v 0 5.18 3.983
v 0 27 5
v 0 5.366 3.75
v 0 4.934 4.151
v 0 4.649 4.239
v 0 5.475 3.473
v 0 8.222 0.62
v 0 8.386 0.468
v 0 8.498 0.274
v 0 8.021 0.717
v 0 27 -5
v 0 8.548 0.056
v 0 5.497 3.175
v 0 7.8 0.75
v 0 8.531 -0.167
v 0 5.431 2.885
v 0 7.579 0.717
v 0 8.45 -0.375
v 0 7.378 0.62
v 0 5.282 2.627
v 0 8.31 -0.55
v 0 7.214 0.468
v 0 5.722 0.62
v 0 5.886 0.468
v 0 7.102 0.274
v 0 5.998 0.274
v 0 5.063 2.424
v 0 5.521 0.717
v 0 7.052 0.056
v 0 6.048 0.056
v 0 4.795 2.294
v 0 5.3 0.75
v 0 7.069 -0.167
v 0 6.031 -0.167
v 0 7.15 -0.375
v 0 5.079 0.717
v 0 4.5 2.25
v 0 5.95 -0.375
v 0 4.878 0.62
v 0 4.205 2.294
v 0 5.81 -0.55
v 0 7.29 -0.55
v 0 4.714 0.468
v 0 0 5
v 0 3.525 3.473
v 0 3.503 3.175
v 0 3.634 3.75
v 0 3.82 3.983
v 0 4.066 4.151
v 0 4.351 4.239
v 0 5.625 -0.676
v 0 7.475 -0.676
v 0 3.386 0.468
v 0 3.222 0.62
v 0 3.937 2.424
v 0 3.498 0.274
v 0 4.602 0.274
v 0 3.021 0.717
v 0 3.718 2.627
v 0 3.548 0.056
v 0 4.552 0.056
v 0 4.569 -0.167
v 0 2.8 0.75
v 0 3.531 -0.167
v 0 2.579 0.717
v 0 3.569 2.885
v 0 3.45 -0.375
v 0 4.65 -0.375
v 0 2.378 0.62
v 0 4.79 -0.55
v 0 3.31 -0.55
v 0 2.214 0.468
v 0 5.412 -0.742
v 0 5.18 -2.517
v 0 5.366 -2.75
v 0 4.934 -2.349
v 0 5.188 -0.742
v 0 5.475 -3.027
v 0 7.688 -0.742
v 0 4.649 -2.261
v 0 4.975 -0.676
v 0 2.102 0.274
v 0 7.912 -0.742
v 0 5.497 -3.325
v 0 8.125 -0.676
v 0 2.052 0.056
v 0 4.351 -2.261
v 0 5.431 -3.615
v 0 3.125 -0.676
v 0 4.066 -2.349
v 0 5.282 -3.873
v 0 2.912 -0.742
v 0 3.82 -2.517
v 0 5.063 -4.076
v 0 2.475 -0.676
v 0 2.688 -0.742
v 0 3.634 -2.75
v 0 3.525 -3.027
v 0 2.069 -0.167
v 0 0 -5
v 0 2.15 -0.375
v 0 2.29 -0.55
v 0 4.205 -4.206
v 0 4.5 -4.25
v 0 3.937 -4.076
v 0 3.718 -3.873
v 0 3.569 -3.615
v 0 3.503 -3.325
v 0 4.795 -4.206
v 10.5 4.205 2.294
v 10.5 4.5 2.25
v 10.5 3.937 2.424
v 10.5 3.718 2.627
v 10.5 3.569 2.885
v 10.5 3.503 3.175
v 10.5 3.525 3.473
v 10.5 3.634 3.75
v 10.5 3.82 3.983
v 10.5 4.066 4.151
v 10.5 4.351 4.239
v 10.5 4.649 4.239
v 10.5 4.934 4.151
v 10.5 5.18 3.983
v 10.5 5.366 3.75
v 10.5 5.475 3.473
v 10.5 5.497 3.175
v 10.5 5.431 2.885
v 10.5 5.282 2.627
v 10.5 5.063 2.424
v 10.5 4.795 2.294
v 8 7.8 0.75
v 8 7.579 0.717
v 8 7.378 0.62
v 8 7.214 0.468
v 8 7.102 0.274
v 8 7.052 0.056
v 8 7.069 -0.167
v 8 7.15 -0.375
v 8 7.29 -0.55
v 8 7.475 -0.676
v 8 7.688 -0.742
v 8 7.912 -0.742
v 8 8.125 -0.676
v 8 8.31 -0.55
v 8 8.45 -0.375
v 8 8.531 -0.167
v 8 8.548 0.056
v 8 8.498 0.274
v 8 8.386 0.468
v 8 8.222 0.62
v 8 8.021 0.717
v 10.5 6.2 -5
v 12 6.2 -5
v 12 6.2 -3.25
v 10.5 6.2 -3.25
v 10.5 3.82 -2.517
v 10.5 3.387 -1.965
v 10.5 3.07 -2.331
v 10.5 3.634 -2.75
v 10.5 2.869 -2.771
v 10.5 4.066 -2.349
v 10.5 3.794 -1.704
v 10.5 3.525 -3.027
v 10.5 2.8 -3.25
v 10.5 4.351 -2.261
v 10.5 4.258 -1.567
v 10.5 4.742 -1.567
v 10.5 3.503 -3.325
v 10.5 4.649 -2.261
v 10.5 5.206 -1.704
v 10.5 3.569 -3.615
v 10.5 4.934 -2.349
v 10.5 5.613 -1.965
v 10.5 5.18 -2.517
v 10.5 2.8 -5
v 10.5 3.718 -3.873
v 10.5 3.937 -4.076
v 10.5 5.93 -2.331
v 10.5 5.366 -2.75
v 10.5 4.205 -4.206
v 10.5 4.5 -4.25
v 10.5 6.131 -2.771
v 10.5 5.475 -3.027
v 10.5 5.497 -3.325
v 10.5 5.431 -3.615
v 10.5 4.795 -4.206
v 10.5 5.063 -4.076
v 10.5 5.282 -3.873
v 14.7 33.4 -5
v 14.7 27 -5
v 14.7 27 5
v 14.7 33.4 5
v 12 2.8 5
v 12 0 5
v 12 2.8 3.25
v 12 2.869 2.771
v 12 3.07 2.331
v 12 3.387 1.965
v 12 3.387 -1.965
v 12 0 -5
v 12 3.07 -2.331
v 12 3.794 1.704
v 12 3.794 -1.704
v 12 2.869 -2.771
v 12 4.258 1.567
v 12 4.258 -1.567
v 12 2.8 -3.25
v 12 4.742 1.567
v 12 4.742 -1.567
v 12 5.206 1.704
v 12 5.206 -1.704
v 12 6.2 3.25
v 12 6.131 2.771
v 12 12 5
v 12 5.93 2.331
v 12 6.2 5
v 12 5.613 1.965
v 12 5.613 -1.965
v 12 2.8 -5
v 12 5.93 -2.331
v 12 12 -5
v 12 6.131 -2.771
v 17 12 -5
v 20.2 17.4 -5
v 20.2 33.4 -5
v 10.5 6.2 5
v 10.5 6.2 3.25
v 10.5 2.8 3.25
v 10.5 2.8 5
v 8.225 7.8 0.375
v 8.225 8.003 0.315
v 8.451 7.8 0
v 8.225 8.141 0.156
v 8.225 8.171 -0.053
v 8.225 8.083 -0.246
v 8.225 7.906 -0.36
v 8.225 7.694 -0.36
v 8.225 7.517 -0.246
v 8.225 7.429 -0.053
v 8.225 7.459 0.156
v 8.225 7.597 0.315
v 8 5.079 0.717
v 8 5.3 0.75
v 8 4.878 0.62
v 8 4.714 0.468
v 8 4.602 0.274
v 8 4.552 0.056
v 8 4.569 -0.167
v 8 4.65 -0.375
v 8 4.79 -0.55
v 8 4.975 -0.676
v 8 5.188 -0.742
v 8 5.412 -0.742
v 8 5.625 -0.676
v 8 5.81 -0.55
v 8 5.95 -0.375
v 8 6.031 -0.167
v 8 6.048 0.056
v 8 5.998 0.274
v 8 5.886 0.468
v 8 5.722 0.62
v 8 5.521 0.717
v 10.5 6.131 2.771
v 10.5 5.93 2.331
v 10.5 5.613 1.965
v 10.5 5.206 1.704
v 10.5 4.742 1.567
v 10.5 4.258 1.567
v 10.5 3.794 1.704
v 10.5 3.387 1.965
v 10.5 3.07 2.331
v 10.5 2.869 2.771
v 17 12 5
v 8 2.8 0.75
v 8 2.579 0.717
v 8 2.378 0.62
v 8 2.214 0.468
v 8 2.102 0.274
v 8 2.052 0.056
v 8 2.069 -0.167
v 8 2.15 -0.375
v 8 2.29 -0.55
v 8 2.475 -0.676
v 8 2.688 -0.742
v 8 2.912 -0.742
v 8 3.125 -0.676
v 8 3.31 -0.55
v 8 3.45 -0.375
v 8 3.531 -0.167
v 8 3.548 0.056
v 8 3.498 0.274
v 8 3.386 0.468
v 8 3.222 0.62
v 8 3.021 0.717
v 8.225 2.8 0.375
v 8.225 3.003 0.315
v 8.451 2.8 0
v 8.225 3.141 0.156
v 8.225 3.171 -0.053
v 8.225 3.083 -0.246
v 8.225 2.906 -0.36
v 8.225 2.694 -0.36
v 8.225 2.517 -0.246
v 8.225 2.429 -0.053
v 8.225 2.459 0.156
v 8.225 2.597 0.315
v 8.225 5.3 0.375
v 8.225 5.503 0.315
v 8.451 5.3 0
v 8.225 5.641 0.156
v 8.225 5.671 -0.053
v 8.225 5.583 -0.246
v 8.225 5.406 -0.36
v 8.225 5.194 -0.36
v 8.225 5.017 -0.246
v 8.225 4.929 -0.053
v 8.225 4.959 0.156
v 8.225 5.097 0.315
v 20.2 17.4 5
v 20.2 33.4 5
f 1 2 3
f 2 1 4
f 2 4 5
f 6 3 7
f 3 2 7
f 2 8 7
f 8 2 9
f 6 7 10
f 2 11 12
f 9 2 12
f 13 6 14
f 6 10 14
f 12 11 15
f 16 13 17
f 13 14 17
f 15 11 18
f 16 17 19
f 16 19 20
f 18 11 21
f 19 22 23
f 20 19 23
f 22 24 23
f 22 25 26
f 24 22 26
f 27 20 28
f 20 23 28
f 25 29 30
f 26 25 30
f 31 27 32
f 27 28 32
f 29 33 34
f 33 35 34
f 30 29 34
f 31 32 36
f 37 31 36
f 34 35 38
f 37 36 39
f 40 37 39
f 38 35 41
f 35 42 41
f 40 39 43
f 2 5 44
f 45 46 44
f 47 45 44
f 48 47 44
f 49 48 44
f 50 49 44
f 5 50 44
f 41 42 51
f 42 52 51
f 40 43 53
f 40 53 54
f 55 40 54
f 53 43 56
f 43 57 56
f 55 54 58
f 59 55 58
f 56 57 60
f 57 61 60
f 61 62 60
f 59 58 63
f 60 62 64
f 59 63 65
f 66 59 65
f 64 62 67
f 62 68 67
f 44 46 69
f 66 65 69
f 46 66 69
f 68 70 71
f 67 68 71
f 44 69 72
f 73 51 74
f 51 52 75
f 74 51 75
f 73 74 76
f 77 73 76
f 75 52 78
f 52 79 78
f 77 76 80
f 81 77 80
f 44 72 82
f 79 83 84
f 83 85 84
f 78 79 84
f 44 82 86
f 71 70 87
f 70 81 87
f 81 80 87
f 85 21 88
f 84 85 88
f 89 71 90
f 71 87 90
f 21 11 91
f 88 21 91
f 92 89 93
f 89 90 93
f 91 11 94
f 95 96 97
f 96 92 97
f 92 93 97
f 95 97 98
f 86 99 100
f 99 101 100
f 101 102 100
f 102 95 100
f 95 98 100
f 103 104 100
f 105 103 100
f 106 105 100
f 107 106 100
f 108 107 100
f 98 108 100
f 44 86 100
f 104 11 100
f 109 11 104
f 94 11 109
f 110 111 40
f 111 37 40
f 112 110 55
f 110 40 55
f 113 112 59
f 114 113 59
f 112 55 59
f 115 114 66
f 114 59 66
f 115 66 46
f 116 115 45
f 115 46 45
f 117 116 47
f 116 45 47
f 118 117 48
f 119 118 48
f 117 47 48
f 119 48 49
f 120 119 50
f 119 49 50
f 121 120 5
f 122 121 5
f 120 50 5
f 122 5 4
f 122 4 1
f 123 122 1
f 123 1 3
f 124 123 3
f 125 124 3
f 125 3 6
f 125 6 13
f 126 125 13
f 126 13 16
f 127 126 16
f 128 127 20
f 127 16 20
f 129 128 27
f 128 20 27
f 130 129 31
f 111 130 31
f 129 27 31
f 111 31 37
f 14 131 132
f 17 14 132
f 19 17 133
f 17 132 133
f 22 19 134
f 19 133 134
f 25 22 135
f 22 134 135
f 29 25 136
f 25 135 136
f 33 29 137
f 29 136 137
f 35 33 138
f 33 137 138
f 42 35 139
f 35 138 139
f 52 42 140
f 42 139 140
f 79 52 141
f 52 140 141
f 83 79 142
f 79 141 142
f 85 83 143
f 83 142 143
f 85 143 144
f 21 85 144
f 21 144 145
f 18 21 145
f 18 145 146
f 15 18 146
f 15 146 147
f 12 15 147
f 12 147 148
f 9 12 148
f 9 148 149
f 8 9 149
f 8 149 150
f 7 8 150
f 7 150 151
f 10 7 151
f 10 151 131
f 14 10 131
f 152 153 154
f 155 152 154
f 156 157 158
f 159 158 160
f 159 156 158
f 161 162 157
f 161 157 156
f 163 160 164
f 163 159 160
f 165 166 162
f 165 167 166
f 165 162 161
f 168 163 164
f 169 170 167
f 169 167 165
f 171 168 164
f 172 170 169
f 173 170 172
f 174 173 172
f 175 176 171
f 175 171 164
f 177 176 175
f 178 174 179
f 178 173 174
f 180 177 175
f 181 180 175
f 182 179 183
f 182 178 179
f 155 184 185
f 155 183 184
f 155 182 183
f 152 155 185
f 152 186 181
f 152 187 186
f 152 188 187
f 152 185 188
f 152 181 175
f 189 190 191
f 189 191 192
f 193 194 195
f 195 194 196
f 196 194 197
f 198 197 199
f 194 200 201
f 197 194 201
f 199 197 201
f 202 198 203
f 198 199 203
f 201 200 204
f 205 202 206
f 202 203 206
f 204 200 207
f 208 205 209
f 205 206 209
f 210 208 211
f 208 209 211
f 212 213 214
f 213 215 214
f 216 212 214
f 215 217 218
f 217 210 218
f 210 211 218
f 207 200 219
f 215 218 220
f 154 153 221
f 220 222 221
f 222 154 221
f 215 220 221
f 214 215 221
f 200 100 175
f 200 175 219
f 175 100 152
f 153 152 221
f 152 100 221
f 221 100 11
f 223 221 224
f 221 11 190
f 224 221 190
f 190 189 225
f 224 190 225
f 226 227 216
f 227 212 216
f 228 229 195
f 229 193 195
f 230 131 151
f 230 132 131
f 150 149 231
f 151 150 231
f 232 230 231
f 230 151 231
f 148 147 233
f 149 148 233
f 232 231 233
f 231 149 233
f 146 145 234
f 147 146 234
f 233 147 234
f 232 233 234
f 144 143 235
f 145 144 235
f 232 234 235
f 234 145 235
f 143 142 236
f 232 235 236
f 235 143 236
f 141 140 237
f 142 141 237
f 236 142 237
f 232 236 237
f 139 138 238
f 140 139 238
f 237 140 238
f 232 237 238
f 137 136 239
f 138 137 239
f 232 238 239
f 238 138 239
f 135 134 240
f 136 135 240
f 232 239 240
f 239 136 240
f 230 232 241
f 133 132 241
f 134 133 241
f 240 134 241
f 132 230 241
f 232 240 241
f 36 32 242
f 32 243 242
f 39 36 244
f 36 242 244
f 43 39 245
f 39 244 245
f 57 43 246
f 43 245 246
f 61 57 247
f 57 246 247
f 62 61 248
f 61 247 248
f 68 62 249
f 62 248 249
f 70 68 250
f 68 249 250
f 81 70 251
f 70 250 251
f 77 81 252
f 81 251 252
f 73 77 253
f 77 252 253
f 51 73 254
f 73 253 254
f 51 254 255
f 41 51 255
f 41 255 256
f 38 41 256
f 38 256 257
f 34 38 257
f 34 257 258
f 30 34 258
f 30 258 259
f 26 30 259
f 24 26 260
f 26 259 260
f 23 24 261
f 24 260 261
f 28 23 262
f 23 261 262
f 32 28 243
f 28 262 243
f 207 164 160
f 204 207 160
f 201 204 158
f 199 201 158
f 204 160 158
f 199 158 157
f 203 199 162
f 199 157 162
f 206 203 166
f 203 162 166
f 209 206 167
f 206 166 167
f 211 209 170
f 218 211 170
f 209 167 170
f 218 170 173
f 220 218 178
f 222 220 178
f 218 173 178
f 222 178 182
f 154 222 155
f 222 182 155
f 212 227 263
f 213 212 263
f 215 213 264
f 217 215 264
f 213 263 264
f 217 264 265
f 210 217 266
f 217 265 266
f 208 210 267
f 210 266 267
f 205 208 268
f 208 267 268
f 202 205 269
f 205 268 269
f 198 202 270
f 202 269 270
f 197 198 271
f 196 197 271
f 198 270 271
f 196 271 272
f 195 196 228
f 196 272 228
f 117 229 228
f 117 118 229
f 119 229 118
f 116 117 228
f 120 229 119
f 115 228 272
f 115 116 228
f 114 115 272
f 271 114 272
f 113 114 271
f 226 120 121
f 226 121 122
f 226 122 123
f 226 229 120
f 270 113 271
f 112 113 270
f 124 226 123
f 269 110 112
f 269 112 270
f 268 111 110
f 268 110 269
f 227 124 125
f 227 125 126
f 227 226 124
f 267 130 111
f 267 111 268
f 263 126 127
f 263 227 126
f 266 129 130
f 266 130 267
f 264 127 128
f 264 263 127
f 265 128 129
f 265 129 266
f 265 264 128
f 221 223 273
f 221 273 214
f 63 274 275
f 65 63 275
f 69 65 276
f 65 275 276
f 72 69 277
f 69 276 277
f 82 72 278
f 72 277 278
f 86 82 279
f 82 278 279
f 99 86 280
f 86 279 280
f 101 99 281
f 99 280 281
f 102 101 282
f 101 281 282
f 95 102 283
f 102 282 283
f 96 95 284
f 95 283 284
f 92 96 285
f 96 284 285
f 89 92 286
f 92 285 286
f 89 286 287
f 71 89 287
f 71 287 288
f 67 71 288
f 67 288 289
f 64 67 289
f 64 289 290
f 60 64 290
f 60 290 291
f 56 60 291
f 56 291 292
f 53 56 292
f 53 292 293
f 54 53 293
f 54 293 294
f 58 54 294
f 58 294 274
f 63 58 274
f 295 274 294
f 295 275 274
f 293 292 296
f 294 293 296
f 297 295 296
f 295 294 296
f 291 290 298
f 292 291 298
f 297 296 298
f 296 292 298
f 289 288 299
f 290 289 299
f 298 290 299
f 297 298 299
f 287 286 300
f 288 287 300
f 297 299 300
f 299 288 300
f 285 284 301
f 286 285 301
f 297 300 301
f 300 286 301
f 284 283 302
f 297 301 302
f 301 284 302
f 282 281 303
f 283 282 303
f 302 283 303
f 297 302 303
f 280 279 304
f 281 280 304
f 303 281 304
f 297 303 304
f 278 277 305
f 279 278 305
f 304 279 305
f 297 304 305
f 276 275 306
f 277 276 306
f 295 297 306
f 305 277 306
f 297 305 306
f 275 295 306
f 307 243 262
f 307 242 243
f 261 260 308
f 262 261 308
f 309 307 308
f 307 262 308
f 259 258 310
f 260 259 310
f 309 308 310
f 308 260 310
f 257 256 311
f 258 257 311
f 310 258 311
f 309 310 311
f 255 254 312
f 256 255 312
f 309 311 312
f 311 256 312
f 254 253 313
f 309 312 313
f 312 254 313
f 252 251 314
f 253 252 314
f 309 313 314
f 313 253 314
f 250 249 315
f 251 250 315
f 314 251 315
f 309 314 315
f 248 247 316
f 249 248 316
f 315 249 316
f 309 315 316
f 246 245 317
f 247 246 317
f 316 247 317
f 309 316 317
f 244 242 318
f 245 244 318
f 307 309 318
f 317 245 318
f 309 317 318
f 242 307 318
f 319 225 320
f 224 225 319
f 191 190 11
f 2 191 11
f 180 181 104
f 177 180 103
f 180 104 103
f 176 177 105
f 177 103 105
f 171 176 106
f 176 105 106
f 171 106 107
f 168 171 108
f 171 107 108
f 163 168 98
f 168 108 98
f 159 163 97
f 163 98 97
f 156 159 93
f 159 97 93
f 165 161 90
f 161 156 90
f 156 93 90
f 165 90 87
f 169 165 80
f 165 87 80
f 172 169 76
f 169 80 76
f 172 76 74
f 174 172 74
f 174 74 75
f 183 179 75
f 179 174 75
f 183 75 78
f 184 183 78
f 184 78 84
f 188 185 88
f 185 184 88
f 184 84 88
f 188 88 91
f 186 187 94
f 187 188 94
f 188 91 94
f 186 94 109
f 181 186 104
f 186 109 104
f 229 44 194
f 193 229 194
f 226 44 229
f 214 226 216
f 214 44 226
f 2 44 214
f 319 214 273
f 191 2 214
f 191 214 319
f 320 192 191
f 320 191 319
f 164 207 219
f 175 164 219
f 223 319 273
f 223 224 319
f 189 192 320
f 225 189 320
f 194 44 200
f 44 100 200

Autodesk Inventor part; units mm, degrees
ref_plane "YZ Plane" through (0, 0, 0) normal (1, 0, 0) x (0, 1, 0)
ref_plane "XZ Plane" through (0, 0, 0) normal (0, 1, 0) x (-1, 0, 0)
ref_plane "XY Plane" through (0, 0, 0) normal (0, 0, 1) x (1, 0, 0)
sketch "Skizze1" plane through (0, 0, 0) normal (0, 0, 1) x (1, 0, 0)
  line L0 (0, 40.08) -> (0, -6.68) projected
  line L1 (-4.04, 0) -> (24.24, 0) projected
  line L2 (0, 0) -> (12, 0)
  line L3 (12, 0) -> (12, 12)
  line L4 (14.7, 27) -> (0, 27)
  line L5 (0, 27) -> (0, 0)
  line L6 (14.7, 27) -> (14.7, 33.4)
  line L7 (14.7, 33.4) -> (20.2, 33.4)
  line L8 (20.2, 33.4) -> (20.2, 17.4)
  line L9 (20.2, 17.4) -> (17, 12)
  line L10 (17, 12) -> (12, 12)
  dimension "d0" = 5.5
  dimension "d1" = 14.7
  dimension "d3" = 12
  dimension "d4" = 27
  dimension "d5" = 12
  dimension "d6" = 5
  dimension "d7" = 6.4
  dimension "d8" = 16
extrude "Extrusion1" add sketch "Skizze1" along normal mid plane 10
hole "Bohrung1" at (12, 4.5, 3.25) direction (-1, 0, 0) diameter 2 end up to surface counterbore diameter 3.4 counterbore depth 1.5
sketch "Skizze2" plane through (12, 0, -5) normal (1, 0, 0) x (0, 0, -1)
  circle A0 centre (-8.25, 4.5) radius 1.7 projected
  line L0 (-10, 0) -> (-10, 27) projected
  line L1 (-10, 2.8) -> (-8.25, 2.8)
  line L2 (-8.25, 2.8) -> (-8.25, 6.2)
  line L3 (-8.25, 6.2) -> (-10, 6.2)
  line L4 (-10, 6.2) -> (-10, 2.8)
  point P0 (-10, 5.3874)
  point P1 (-10, 3.6126)
extrude "Extrusion2" cut sketch "Skizze2" against normal up to surface (1.5 mm away) contours L2 A0 | A0 L1 L0 L3 picked at (-8.7614, 4.0923)
mirror "Spiegeln1" about plane through (0, 0, 0) normal (0, 0, 1) of "Bohrung1", "Extrusion2"
sketch "Skizze3" plane through (0, 0, 5) normal (-1, 0, 0) x (0, 0, 1)
  line L0 (0, 0) -> (0, 27) projected
  line L1 (0, 0) -> (-10, 0) projected
  circle A0 centre (-1.75, 4.5) radius 1 projected
  point P0 (-5, 2.8)
  point P1 (-5, 5.3)
  point P2 (-5, 7.8)
  dimension "d22" = 2.5
  dimension "d23" = 2.5
  dimension "d24" = 2.8
  dimension "d25" = 7.8
  dimension "d26" = 5
  dimension "d27" = 5.3
  dimension "d35" = 0.8
hole "Bohrung2" at (0, 2.8, 0) at (0, 5.3, 0) at (0, 7.8, 0) direction (1, 0, 0) diameter 1.5 depth 8 tip angle 118
equation "\"d23\" = d22"
properties part number "Valve_Outside"
